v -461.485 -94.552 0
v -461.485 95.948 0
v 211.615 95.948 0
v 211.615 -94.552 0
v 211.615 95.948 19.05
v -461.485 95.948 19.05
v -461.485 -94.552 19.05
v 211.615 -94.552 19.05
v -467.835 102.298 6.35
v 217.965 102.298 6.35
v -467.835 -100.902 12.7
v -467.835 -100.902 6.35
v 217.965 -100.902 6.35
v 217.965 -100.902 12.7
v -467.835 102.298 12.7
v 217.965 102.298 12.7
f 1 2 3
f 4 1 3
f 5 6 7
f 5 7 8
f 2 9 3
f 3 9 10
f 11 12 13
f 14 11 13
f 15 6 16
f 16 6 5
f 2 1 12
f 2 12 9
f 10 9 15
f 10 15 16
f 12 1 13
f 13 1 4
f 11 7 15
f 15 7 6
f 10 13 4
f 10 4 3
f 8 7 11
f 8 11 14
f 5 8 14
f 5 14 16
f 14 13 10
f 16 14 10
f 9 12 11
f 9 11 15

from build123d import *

# Parameters (mm, degrees)
F0_W     = 685.8
F0_H     = 203.2
F1_DEPTH = 19.05
F2_SIZE  = 6.35
F3_SIZE  = 6.35


with BuildPart() as f1:
    # F0 (on Top) → F1 (new body)
    with BuildSketch(Plane.XY):
        with Locations((-124.934961, 0.697705)):
            Rectangle(F0_W, F0_H)
    extrude(amount=F1_DEPTH)

    # F2
    f2_edges = [f1.edges().sort_by_distance(p)[0] for p in [
        (217.965039, 0.697705, 19.05),
        (-124.934961, 102.297705, 19.05),
        (-467.834961, 0.697705, 19.05),
        (-124.934961, -100.902295, 19.05),
    ]]
    chamfer(f2_edges, length=F2_SIZE)

    # F3
    f3_edges = [f1.edges().sort_by_distance(p)[0] for p in [
        (217.965039, 0.697705, 0),
        (-124.934961, 102.297705, 0),
        (-467.834961, 0.697705, 0),
        (-124.934961, -100.902295, 0),
    ]]
    chamfer(f3_edges, length=F3_SIZE)


solid = f1.part
